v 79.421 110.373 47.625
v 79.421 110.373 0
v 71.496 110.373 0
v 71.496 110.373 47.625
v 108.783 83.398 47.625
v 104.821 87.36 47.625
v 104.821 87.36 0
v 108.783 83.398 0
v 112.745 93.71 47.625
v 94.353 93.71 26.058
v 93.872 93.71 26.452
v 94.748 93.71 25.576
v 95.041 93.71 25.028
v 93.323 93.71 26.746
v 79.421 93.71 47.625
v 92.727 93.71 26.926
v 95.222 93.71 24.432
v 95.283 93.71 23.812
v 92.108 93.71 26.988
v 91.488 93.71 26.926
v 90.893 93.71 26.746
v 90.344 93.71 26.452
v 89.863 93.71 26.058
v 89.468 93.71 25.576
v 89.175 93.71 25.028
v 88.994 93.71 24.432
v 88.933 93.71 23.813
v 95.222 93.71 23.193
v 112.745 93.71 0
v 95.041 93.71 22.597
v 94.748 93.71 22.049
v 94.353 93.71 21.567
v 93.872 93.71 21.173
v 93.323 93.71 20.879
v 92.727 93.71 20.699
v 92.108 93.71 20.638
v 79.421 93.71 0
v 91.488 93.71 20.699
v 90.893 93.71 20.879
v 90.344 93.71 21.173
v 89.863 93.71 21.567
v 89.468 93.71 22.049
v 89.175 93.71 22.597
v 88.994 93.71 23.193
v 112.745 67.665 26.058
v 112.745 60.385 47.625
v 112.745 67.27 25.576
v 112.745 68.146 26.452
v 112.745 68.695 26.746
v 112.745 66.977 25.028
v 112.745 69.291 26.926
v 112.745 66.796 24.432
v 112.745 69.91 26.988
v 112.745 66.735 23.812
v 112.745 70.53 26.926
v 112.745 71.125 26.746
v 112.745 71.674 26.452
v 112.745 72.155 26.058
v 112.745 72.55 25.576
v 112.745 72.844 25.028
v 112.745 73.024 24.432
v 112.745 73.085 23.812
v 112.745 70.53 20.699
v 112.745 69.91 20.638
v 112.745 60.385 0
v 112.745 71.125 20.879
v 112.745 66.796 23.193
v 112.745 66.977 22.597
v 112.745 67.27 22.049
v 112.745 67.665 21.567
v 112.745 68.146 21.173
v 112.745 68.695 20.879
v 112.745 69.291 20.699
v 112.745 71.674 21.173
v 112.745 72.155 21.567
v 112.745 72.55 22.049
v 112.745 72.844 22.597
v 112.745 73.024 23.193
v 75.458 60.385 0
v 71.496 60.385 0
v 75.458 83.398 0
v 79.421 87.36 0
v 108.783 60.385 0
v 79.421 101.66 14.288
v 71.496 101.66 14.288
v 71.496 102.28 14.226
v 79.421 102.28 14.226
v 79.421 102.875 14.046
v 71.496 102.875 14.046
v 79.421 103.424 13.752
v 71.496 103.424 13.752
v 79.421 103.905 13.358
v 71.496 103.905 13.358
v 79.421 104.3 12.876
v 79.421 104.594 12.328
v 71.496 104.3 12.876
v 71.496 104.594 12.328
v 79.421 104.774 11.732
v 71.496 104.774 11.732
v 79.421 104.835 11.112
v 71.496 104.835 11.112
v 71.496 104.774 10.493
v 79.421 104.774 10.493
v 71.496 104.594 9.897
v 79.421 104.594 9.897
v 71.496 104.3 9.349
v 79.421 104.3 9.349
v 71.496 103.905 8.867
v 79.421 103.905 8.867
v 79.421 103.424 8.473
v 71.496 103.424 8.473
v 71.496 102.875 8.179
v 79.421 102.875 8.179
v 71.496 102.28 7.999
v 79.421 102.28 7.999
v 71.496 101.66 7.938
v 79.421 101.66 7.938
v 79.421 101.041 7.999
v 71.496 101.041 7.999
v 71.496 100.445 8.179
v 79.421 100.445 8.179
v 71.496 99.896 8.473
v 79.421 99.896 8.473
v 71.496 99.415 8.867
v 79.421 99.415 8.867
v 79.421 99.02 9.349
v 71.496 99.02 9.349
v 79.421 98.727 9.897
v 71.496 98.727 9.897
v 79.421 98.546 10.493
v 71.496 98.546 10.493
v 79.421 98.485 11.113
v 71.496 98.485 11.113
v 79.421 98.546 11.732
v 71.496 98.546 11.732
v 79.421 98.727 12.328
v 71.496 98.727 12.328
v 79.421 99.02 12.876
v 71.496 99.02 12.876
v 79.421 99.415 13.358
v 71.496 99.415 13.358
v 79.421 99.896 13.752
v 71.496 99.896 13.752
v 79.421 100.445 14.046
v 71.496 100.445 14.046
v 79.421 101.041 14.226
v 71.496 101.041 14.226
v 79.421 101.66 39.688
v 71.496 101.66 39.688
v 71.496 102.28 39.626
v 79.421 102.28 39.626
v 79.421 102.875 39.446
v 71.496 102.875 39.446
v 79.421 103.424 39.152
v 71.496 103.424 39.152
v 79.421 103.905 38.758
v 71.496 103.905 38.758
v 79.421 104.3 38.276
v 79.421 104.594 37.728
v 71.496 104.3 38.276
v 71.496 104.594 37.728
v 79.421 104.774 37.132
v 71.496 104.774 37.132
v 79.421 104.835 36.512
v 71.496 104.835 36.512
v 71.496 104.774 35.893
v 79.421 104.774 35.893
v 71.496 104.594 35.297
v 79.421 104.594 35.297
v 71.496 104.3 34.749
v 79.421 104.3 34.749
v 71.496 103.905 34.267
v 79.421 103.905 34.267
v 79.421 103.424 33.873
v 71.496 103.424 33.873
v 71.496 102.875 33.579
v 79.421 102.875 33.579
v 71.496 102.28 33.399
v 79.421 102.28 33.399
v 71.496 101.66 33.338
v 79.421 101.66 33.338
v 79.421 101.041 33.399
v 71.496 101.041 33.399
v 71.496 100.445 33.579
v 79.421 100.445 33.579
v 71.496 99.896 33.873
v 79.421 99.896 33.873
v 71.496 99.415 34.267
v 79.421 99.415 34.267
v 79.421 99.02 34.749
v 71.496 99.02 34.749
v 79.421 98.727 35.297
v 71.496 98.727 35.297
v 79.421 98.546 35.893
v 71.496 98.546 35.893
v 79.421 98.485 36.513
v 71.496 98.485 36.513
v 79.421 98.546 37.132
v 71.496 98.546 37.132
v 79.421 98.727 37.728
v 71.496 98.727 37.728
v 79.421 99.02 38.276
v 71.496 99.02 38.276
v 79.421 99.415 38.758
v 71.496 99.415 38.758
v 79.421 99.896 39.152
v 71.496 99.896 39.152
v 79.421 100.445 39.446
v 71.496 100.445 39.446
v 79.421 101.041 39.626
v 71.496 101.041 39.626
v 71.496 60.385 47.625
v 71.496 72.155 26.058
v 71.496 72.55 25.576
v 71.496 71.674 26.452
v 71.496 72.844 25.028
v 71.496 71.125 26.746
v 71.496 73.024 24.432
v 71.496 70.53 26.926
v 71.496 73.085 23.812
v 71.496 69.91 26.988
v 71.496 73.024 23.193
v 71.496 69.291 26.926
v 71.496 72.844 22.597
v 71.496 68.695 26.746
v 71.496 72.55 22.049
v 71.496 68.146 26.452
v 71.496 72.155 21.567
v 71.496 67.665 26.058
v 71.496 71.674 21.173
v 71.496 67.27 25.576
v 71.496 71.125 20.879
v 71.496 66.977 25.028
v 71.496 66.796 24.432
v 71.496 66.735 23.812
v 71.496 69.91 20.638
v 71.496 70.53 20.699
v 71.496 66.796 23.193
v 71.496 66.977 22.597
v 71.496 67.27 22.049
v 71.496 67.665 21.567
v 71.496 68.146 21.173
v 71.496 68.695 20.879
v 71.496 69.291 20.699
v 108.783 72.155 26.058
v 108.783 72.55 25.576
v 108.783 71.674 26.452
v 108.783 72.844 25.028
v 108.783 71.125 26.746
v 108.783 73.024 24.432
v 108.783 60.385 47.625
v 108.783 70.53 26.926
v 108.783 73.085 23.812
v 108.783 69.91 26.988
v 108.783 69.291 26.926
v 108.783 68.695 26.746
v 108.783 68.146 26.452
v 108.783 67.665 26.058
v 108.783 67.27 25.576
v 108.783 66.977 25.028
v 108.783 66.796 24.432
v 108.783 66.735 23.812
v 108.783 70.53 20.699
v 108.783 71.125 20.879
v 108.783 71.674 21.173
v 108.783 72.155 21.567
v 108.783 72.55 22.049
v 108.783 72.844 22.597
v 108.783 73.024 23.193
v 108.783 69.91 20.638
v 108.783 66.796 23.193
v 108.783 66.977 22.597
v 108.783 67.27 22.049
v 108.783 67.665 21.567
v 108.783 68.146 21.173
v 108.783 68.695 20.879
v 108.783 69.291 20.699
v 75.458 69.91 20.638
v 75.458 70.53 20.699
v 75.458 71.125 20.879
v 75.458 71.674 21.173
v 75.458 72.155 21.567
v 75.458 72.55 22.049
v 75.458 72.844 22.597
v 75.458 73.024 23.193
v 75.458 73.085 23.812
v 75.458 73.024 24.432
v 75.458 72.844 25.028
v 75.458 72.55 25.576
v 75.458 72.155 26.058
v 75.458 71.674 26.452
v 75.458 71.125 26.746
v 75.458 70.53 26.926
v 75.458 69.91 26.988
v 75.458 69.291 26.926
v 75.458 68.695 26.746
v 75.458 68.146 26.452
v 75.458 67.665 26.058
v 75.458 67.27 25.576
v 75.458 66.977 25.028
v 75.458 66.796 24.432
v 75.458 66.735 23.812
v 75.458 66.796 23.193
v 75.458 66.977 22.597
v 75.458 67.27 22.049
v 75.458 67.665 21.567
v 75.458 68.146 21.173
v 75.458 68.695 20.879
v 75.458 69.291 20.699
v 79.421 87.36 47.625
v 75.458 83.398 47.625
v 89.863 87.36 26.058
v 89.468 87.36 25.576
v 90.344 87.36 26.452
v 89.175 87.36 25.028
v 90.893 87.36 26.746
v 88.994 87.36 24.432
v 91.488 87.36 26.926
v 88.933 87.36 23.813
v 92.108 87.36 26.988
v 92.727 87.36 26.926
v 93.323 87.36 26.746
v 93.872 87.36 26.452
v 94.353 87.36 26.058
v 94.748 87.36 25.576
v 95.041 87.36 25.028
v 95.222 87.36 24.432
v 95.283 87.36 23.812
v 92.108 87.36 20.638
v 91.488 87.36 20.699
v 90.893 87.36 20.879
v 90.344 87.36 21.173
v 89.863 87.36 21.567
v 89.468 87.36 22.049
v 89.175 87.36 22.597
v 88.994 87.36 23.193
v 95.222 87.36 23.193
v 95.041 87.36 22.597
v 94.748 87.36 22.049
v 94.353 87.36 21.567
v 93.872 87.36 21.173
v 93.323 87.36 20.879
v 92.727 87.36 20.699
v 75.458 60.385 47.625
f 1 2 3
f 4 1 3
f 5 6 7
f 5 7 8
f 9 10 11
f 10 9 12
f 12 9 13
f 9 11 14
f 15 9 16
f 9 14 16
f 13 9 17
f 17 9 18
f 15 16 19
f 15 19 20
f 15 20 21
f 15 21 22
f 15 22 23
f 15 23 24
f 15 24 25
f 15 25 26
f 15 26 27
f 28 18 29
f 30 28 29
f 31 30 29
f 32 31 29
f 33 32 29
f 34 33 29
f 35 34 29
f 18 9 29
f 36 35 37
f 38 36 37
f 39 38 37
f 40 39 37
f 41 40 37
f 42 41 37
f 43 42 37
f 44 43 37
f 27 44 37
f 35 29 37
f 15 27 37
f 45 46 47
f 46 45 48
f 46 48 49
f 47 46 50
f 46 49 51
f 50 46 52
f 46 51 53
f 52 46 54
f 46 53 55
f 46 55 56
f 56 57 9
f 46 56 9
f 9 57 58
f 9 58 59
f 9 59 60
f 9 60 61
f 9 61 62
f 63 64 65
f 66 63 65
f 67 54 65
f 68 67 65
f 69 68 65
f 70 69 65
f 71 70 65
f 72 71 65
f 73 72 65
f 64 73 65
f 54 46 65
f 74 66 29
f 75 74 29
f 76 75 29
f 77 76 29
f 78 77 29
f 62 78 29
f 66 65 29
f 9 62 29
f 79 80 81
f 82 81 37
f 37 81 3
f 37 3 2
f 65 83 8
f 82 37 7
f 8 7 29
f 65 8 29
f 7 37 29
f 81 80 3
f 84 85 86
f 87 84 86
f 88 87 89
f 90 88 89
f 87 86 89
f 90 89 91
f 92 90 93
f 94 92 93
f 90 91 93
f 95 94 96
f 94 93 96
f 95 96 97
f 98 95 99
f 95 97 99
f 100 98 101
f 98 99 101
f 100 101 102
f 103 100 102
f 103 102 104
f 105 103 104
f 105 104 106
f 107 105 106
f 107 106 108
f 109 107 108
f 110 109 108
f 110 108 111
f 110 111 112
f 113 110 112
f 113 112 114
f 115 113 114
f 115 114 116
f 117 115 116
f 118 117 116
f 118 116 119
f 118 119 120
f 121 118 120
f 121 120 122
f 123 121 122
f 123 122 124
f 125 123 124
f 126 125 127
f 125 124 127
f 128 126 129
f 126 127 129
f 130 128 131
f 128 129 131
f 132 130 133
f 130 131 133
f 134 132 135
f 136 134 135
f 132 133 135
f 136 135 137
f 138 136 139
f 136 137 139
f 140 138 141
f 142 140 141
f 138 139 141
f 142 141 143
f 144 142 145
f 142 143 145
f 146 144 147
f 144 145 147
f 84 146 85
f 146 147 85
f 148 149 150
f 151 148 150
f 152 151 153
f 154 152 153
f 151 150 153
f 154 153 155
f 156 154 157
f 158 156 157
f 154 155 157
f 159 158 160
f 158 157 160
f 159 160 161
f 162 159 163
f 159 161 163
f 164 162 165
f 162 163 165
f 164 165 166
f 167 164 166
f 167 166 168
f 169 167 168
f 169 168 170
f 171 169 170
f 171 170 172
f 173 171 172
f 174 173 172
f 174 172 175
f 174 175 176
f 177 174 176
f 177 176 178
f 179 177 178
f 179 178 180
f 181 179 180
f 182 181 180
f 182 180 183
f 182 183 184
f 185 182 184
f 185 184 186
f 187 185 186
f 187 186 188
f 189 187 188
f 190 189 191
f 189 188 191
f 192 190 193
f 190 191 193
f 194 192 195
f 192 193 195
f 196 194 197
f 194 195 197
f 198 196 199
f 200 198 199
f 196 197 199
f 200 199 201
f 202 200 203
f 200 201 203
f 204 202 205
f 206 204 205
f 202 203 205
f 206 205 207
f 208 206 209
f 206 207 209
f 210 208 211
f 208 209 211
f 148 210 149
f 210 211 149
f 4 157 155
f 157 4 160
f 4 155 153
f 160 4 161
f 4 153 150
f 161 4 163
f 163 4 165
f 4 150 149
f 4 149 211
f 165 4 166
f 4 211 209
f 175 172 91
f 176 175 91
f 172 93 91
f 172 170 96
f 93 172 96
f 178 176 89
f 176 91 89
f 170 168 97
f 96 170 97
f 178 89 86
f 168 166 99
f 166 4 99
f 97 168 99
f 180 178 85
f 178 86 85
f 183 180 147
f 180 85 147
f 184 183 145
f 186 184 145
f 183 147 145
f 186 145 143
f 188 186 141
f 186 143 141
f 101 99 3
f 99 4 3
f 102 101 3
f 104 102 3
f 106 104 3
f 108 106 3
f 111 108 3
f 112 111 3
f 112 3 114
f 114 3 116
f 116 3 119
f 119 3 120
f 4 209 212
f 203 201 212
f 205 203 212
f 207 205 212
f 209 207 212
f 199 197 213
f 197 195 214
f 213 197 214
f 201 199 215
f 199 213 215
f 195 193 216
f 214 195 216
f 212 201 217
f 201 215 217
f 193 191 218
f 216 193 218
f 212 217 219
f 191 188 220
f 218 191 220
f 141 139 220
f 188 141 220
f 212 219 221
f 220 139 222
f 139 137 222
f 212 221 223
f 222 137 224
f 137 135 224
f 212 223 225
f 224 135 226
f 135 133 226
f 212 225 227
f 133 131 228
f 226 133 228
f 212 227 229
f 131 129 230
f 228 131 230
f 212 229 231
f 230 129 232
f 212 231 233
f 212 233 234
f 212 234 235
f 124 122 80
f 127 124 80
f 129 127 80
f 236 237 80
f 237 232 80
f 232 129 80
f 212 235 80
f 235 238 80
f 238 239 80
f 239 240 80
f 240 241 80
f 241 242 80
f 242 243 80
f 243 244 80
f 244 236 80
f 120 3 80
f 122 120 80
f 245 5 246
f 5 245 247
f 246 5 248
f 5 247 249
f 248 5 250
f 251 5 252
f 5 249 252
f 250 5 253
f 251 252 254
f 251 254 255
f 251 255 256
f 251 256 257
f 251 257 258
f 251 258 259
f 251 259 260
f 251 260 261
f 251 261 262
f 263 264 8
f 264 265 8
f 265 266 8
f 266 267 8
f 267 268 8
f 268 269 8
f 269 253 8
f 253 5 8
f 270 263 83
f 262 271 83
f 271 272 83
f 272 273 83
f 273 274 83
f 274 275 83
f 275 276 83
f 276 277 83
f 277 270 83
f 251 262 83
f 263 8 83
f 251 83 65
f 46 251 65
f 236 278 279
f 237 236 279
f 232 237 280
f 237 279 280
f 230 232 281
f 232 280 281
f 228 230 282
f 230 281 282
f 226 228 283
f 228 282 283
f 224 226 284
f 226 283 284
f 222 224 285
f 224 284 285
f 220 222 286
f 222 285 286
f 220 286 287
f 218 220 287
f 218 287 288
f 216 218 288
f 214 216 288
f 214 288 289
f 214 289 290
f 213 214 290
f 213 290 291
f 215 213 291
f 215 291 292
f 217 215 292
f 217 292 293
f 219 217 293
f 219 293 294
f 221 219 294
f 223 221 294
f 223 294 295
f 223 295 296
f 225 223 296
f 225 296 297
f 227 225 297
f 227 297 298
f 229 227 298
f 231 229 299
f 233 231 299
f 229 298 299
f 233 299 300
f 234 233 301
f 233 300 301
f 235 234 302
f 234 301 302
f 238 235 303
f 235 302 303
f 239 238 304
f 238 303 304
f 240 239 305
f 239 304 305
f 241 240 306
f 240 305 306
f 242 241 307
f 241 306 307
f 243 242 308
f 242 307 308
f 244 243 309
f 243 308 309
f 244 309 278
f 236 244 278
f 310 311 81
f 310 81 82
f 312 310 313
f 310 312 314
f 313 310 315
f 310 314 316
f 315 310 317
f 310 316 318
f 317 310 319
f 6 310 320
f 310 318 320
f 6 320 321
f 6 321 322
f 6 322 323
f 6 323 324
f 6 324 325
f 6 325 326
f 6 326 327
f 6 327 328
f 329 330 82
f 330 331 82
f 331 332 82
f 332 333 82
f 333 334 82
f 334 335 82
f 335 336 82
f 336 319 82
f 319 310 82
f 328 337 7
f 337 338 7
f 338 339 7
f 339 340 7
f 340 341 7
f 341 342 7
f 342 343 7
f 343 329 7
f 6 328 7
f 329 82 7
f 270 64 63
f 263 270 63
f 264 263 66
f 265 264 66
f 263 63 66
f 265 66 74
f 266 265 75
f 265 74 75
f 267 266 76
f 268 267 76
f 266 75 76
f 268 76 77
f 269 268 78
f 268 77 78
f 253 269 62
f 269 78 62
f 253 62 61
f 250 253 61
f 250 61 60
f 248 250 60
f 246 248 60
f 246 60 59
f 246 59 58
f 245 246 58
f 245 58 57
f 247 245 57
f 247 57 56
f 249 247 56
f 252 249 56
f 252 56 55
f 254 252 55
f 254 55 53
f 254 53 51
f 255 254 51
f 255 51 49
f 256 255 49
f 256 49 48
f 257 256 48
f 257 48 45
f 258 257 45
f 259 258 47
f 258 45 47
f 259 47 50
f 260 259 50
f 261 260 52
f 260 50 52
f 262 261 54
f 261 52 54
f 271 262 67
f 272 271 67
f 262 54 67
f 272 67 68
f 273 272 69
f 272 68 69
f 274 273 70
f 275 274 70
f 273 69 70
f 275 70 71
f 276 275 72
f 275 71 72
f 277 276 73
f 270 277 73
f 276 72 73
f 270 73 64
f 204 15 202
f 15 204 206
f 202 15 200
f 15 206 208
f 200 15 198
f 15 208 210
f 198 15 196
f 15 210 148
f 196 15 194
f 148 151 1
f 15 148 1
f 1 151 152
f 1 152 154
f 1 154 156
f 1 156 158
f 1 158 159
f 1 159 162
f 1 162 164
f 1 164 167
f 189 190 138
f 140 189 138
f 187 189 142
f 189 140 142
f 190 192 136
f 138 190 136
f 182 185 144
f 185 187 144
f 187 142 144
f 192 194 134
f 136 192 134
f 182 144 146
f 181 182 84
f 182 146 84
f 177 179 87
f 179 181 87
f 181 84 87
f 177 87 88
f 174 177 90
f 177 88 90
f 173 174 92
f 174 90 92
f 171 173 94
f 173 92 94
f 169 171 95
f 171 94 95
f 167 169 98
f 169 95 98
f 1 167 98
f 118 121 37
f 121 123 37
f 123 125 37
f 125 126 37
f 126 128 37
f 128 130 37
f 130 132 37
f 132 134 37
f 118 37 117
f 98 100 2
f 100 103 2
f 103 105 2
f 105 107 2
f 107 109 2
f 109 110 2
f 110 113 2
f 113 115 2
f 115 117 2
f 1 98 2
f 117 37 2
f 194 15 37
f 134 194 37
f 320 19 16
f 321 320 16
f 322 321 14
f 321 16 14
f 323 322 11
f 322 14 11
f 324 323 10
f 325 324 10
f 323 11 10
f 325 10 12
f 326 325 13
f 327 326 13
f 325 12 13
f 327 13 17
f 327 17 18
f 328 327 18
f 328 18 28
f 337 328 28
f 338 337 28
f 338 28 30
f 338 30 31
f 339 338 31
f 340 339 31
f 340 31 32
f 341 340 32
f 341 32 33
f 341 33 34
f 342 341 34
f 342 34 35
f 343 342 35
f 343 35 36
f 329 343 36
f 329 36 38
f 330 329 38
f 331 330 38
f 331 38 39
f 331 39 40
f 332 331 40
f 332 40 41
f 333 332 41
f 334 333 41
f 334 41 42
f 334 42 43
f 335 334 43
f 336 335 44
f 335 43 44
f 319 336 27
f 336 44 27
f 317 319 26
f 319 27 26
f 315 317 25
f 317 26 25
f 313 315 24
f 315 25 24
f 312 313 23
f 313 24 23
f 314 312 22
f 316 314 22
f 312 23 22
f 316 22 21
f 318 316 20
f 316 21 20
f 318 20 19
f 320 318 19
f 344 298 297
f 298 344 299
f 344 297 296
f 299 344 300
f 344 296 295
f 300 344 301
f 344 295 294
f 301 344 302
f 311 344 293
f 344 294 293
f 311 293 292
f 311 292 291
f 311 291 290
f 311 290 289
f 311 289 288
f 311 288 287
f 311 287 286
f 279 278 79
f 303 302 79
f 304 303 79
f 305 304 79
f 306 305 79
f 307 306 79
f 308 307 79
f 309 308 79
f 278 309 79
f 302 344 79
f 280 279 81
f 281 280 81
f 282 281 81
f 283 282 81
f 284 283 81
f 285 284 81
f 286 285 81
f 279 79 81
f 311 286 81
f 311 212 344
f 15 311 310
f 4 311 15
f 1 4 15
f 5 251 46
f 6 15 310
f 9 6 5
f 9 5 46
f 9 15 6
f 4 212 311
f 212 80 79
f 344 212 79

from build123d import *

# Parameters (mm, degrees)
BOSS_EXTRUDE2_DEPTH = 47.625
SKETCH2_R           = 3.175
CUT_EXTRUDE1_DEPTH  = 127.847111609
SKETCH4_R           = 3.175
CUT_EXTRUDE2_DEPTH  = 128.089653795
SKETCH5_R           = 3.175
CUT_EXTRUDE3_DEPTH  = 47.625


with BuildPart() as part:
    # Model → Boss-Extrude2 (new body)
    with BuildSketch(Plane.XY):
        Polygon((112.745318321, 60.38539613), (112.745318321, 93.710196132), (79.420518319, 93.710196132), (79.420518319, 110.37259613), (71.49571832, 110.37259613), (71.49571832, 60.38539613), (75.45811832, 60.38539613), (75.45811832, 83.397796131), (79.420518319, 87.360196131), (104.82051832, 87.360196131), (108.782918319, 83.397796131), (108.782918319, 60.38539613), align=None)
    extrude(amount=BOSS_EXTRUDE2_DEPTH)

    # Sketch2 → Cut-Extrude1 (cut, through all)
    with BuildSketch(Plane(origin=(0, 93.710196132, 0), x_dir=(1, 0, 0), z_dir=(0, 1, 0))):
        with Locations(Location((92.107818321, -23.8125, 0), (0, 0, 270))):
            Circle(SKETCH2_R)
    extrude(amount=-CUT_EXTRUDE1_DEPTH, mode=Mode.SUBTRACT)

    # Sketch4 → Cut-Extrude2 (cut, through all)
    with BuildSketch(Plane.ZY.offset(-71.49571832)):
        with Locations((11.1125, 101.66039613)):
            Circle(SKETCH4_R)
        with Locations((36.5125, 101.66039613)):
            Circle(SKETCH4_R)
    extrude(amount=-CUT_EXTRUDE2_DEPTH, mode=Mode.SUBTRACT)

    # Sketch5 → Cut-Extrude3 (cut)
    with BuildSketch(Plane(origin=(112.745318321, 0, 0), x_dir=(0, 0, -1), z_dir=(1, 0, 0))):
        with Locations((-23.8125, 69.91039613)):
            Circle(SKETCH5_R)
    extrude(amount=-CUT_EXTRUDE3_DEPTH, mode=Mode.SUBTRACT)


solid = part.part
